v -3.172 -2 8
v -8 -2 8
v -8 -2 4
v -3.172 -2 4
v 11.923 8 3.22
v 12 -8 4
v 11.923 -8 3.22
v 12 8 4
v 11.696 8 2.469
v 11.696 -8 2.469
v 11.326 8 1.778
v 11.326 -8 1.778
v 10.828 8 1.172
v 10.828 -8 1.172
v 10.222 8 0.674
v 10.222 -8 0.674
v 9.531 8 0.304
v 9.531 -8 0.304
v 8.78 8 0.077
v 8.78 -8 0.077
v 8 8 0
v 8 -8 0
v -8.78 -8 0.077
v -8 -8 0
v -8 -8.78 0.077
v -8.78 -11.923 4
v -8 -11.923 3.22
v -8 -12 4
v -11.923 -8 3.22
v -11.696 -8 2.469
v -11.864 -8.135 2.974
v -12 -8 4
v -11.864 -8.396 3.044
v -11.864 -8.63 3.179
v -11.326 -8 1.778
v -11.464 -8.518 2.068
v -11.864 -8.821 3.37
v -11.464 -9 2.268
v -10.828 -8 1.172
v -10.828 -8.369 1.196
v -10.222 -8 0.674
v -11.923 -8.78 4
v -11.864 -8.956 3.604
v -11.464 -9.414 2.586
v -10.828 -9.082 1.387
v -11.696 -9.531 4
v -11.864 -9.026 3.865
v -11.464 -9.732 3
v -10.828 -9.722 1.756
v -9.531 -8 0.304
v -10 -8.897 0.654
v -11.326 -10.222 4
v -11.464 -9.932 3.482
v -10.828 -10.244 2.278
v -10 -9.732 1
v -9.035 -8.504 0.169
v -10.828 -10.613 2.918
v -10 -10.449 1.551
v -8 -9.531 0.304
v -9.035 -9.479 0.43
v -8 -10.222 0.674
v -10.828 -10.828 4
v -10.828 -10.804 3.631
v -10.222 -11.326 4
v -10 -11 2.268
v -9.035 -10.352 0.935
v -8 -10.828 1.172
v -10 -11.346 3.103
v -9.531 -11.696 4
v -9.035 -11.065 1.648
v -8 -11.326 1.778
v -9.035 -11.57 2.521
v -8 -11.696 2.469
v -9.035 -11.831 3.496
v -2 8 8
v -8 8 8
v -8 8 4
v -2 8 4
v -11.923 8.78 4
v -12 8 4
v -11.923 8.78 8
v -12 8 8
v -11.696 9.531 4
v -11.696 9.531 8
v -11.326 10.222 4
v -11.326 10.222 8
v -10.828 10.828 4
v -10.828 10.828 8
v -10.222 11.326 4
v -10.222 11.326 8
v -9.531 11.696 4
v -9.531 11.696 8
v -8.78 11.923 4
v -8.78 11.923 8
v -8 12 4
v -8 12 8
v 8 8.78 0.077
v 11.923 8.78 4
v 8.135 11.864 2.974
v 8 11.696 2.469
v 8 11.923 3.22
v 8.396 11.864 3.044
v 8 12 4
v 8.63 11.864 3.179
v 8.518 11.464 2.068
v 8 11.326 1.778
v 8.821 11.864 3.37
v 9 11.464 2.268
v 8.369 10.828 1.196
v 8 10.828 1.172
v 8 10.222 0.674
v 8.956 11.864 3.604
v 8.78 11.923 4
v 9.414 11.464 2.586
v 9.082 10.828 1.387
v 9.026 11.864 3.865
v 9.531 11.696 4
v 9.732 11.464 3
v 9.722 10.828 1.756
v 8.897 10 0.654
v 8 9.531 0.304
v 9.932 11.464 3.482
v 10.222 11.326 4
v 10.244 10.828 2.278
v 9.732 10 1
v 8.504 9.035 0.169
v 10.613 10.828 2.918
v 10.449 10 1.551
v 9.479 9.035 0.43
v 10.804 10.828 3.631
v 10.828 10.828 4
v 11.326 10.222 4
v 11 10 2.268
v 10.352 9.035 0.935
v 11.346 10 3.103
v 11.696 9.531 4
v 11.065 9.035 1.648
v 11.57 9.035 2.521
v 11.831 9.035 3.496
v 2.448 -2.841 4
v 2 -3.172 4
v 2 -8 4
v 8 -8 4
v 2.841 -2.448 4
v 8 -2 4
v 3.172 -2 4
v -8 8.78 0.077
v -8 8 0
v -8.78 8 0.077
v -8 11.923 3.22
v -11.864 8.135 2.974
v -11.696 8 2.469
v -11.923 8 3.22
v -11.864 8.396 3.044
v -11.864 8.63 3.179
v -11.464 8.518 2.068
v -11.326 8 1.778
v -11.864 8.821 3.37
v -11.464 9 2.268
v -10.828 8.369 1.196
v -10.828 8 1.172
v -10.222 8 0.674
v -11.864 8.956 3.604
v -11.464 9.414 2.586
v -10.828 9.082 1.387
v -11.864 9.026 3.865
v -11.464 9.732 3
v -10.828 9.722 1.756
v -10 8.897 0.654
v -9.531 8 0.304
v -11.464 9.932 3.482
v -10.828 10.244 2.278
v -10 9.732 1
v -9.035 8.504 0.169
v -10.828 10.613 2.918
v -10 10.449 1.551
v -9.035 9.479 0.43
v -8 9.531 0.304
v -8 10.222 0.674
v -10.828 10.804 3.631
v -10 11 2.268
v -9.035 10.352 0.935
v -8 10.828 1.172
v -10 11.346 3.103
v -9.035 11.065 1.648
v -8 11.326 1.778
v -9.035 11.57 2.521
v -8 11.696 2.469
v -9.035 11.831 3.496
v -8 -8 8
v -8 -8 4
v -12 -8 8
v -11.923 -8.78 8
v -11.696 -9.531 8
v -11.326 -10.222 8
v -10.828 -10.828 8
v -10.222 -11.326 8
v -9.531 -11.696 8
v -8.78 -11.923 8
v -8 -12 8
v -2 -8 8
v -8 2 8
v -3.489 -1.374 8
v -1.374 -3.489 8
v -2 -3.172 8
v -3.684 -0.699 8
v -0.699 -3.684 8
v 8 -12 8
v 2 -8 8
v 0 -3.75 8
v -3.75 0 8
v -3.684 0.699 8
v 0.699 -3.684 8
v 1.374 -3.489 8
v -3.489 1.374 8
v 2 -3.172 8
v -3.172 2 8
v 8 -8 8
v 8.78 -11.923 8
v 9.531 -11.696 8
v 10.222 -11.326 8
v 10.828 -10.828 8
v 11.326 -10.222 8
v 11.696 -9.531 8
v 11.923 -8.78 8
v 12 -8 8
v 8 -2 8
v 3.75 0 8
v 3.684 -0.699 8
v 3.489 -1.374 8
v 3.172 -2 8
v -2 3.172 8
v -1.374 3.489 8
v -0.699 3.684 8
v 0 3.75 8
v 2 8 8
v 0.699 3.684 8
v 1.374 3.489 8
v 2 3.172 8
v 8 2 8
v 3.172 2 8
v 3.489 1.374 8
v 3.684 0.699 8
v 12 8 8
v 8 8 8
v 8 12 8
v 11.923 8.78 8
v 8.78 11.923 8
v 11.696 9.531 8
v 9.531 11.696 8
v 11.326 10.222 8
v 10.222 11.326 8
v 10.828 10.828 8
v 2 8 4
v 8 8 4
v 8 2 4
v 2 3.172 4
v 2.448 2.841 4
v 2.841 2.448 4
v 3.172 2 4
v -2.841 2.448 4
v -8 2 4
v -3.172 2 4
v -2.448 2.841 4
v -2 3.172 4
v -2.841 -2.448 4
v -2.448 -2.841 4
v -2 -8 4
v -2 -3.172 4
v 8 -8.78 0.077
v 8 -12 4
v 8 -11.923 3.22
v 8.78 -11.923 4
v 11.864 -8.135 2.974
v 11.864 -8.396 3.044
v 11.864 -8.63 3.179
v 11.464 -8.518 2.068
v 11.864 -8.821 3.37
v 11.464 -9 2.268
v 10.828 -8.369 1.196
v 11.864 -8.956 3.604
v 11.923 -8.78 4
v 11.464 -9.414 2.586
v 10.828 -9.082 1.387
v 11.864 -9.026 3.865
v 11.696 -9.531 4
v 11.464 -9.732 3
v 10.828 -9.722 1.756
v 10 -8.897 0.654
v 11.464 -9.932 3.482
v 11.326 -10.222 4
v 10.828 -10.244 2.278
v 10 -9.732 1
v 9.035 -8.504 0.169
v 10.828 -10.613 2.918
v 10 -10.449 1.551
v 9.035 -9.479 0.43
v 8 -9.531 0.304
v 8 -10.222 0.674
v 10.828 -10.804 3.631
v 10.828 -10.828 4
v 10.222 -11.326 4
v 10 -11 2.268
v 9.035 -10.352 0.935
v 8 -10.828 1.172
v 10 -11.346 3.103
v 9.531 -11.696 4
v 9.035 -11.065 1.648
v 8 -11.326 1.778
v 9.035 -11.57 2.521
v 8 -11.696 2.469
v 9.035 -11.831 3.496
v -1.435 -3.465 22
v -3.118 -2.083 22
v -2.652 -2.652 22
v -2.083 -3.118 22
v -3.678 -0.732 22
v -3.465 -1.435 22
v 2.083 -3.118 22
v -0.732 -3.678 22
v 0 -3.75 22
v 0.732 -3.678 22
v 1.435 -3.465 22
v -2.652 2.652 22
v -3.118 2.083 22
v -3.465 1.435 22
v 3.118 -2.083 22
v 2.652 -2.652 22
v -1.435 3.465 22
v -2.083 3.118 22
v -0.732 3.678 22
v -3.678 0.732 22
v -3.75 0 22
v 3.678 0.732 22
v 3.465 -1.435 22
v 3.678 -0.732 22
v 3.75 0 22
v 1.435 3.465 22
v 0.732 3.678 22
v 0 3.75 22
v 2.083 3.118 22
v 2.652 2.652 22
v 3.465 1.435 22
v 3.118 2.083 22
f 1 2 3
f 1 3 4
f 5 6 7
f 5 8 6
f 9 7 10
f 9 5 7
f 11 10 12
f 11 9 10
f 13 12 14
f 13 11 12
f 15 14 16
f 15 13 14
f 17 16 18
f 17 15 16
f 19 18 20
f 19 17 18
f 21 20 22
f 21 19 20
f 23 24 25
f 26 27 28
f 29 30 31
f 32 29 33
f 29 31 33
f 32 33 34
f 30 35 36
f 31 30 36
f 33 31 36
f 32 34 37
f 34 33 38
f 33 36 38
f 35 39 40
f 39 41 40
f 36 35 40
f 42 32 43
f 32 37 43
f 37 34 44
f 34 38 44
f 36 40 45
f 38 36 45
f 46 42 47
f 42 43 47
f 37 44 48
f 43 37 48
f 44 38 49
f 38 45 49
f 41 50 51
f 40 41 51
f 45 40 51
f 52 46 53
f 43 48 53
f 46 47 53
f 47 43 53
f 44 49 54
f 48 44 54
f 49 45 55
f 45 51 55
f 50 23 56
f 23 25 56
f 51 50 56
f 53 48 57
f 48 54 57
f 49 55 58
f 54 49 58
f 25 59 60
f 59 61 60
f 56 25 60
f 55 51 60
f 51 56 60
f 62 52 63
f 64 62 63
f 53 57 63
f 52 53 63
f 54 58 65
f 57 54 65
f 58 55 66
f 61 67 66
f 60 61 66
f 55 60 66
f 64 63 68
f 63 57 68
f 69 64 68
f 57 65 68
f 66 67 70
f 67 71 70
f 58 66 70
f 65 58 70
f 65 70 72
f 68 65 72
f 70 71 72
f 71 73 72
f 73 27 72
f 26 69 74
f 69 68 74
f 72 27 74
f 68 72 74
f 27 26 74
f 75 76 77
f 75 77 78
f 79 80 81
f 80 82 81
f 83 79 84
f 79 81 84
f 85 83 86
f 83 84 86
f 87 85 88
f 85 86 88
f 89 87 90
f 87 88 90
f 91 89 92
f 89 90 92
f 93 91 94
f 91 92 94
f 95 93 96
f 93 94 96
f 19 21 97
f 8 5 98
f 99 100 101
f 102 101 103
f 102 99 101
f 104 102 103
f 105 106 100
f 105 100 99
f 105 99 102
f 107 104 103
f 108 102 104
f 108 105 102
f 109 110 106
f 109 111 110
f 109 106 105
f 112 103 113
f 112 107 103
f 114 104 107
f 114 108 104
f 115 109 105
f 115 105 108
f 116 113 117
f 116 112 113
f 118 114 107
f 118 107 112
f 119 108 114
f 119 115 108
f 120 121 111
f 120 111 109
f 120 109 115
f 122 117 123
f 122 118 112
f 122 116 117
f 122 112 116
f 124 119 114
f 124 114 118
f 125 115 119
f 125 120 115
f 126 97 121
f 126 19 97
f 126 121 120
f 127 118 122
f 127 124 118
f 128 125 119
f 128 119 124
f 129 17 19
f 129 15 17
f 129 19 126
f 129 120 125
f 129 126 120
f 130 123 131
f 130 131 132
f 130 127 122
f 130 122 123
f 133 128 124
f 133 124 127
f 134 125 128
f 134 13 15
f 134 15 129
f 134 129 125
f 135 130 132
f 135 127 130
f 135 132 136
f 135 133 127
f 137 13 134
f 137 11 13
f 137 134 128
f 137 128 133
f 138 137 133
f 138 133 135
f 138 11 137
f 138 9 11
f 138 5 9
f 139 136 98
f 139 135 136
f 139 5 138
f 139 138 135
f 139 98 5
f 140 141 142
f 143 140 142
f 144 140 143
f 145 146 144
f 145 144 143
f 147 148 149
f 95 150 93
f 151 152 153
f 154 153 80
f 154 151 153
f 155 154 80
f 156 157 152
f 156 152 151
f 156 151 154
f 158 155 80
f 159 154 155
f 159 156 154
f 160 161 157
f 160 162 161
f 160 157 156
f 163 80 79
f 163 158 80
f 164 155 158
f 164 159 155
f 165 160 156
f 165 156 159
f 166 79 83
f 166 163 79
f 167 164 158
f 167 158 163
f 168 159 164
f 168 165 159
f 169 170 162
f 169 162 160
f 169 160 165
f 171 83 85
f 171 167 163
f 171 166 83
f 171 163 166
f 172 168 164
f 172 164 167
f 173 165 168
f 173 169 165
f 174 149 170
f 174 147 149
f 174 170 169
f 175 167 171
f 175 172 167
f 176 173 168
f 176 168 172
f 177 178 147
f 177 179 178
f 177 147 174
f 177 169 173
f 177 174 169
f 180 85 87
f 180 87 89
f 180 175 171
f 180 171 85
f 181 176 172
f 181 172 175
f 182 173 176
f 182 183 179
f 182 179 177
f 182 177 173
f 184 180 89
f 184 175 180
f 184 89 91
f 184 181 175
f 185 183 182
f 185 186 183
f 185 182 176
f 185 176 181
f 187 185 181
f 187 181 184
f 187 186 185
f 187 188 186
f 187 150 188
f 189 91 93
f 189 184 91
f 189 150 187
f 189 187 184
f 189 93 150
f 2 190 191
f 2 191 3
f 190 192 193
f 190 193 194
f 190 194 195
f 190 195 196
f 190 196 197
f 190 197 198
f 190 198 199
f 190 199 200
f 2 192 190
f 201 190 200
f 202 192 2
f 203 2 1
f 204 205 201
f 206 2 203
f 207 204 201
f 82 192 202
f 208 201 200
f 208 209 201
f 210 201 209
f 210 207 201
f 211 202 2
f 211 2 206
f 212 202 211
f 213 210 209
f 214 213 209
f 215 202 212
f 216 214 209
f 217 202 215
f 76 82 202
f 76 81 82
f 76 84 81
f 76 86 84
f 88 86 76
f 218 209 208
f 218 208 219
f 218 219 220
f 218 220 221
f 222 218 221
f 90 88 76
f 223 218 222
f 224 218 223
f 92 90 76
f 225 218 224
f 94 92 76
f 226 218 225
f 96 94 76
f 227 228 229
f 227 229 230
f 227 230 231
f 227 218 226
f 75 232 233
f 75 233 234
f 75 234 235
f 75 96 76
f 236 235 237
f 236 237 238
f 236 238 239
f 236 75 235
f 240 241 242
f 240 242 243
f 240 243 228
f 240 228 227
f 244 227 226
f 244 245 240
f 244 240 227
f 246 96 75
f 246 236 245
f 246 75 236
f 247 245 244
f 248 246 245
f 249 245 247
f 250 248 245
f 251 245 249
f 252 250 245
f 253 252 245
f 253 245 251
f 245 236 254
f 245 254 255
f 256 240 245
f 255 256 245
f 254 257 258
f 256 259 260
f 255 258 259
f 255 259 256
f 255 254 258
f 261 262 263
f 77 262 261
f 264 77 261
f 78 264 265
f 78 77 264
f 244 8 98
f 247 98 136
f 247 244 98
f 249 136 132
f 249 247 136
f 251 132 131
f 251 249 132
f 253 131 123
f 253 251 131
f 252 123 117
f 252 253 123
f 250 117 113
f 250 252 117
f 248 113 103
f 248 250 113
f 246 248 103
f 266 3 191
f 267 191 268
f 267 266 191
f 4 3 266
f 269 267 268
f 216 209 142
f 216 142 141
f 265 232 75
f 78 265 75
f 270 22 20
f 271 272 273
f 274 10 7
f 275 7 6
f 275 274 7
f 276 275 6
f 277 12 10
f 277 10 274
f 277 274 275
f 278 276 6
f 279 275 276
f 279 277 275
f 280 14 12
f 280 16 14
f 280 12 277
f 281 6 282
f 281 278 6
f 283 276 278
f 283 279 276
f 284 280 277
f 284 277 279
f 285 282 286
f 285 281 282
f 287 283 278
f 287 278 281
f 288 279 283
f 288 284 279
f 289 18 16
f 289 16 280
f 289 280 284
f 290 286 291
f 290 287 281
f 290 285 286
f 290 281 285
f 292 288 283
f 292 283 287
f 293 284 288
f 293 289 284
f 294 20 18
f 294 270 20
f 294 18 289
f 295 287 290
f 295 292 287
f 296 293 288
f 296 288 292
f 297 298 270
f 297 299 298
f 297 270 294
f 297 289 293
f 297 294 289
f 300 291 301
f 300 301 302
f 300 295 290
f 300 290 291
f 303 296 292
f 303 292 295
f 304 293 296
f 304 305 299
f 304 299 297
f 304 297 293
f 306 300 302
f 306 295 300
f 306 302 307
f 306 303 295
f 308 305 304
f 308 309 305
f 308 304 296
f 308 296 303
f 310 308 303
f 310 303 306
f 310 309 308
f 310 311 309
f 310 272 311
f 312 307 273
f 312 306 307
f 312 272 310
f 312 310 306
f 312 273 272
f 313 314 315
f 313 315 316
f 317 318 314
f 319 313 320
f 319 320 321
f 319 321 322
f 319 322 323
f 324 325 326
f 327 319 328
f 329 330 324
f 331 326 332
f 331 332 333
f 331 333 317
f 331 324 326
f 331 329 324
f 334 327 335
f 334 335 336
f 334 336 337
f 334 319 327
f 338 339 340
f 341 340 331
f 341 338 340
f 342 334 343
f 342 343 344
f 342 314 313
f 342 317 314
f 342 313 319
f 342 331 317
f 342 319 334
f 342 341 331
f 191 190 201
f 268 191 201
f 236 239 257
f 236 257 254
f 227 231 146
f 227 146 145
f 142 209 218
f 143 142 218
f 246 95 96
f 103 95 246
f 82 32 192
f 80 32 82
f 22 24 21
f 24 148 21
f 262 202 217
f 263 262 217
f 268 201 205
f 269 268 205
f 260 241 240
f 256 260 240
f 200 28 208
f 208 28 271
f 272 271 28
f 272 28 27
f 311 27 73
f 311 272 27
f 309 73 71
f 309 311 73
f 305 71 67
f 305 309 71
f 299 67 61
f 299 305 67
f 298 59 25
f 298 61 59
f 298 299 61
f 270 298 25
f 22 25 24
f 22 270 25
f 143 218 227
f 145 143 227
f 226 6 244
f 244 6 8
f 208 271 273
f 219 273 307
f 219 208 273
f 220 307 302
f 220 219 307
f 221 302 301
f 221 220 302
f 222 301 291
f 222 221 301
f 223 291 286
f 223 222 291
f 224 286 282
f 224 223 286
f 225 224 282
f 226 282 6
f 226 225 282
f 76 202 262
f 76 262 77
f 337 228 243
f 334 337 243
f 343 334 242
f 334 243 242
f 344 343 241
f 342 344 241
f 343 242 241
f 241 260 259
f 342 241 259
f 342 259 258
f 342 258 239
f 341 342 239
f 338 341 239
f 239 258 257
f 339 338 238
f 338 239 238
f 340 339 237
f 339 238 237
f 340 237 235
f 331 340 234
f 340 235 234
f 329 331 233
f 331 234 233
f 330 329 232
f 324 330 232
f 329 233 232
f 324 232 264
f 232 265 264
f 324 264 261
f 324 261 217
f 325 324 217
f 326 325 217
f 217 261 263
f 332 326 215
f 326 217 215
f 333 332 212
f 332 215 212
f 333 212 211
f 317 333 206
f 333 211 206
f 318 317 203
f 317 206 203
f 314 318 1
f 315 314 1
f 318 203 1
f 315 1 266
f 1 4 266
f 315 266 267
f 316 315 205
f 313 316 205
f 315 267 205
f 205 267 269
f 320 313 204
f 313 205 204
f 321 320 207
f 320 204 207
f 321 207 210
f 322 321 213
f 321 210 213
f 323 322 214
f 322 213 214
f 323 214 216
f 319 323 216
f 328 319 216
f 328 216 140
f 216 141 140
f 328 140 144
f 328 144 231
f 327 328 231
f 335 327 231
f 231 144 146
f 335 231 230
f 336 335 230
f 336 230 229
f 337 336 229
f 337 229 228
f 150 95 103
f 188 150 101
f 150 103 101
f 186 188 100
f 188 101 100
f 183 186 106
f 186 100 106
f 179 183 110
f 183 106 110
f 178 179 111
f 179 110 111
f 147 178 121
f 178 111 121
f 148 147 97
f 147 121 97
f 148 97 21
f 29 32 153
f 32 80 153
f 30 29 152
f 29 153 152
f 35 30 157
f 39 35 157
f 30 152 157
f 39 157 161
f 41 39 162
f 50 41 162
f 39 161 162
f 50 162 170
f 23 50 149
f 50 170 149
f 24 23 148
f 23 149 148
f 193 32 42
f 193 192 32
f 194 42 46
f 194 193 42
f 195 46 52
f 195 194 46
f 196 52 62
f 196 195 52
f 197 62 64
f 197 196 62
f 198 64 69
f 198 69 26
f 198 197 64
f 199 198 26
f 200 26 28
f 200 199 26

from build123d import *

# Parameters (mm, degrees)
F0_W     = 24
F0_H     = 24
F1_DEPTH = 8
F2_R     = 4
F3_W     = 6
F3_H     = 6
F4_DEPTH = 4
F5_R     = 3.75
F6_DEPTH = 18


with BuildPart() as f1:
    # F0 (on Top) → F1 (new body)
    with BuildSketch(Plane.XY):
        Rectangle(F0_W, F0_H)
    extrude(amount=F1_DEPTH)

    # F2
    f2_edges = [f1.edges().sort_by_distance(p)[0] for p in [
        (0, -12, 0),
        (12, 0, 0),
        (0, 12, 0),
        (-12, 0, 0),
        (12, -12, 4),
        (-12, -12, 4),
        (-12, 12, 4),
        (12, 12, 4),
    ]]
    fillet(f2_edges, radius=F2_R)

    # F3 (on face) → F4 (cut)
    with BuildSketch(Plane.XY.offset(8)):
        with Locations((5, 5)):
            Rectangle(F3_W, F3_H)
        with Locations((-5, 5)):
            Rectangle(F3_W, F3_H)
        with Locations((5, -5)):
            Rectangle(F3_W, F3_H)
        with Locations((-5, -5)):
            Rectangle(F3_W, F3_H)
    extrude(amount=-F4_DEPTH, mode=Mode.SUBTRACT)

    # F5 (on face) → F6 (join)
    with BuildSketch(Plane.XY.offset(4)):
        Circle(F5_R)
    extrude(amount=F6_DEPTH)


solid = f1.part
